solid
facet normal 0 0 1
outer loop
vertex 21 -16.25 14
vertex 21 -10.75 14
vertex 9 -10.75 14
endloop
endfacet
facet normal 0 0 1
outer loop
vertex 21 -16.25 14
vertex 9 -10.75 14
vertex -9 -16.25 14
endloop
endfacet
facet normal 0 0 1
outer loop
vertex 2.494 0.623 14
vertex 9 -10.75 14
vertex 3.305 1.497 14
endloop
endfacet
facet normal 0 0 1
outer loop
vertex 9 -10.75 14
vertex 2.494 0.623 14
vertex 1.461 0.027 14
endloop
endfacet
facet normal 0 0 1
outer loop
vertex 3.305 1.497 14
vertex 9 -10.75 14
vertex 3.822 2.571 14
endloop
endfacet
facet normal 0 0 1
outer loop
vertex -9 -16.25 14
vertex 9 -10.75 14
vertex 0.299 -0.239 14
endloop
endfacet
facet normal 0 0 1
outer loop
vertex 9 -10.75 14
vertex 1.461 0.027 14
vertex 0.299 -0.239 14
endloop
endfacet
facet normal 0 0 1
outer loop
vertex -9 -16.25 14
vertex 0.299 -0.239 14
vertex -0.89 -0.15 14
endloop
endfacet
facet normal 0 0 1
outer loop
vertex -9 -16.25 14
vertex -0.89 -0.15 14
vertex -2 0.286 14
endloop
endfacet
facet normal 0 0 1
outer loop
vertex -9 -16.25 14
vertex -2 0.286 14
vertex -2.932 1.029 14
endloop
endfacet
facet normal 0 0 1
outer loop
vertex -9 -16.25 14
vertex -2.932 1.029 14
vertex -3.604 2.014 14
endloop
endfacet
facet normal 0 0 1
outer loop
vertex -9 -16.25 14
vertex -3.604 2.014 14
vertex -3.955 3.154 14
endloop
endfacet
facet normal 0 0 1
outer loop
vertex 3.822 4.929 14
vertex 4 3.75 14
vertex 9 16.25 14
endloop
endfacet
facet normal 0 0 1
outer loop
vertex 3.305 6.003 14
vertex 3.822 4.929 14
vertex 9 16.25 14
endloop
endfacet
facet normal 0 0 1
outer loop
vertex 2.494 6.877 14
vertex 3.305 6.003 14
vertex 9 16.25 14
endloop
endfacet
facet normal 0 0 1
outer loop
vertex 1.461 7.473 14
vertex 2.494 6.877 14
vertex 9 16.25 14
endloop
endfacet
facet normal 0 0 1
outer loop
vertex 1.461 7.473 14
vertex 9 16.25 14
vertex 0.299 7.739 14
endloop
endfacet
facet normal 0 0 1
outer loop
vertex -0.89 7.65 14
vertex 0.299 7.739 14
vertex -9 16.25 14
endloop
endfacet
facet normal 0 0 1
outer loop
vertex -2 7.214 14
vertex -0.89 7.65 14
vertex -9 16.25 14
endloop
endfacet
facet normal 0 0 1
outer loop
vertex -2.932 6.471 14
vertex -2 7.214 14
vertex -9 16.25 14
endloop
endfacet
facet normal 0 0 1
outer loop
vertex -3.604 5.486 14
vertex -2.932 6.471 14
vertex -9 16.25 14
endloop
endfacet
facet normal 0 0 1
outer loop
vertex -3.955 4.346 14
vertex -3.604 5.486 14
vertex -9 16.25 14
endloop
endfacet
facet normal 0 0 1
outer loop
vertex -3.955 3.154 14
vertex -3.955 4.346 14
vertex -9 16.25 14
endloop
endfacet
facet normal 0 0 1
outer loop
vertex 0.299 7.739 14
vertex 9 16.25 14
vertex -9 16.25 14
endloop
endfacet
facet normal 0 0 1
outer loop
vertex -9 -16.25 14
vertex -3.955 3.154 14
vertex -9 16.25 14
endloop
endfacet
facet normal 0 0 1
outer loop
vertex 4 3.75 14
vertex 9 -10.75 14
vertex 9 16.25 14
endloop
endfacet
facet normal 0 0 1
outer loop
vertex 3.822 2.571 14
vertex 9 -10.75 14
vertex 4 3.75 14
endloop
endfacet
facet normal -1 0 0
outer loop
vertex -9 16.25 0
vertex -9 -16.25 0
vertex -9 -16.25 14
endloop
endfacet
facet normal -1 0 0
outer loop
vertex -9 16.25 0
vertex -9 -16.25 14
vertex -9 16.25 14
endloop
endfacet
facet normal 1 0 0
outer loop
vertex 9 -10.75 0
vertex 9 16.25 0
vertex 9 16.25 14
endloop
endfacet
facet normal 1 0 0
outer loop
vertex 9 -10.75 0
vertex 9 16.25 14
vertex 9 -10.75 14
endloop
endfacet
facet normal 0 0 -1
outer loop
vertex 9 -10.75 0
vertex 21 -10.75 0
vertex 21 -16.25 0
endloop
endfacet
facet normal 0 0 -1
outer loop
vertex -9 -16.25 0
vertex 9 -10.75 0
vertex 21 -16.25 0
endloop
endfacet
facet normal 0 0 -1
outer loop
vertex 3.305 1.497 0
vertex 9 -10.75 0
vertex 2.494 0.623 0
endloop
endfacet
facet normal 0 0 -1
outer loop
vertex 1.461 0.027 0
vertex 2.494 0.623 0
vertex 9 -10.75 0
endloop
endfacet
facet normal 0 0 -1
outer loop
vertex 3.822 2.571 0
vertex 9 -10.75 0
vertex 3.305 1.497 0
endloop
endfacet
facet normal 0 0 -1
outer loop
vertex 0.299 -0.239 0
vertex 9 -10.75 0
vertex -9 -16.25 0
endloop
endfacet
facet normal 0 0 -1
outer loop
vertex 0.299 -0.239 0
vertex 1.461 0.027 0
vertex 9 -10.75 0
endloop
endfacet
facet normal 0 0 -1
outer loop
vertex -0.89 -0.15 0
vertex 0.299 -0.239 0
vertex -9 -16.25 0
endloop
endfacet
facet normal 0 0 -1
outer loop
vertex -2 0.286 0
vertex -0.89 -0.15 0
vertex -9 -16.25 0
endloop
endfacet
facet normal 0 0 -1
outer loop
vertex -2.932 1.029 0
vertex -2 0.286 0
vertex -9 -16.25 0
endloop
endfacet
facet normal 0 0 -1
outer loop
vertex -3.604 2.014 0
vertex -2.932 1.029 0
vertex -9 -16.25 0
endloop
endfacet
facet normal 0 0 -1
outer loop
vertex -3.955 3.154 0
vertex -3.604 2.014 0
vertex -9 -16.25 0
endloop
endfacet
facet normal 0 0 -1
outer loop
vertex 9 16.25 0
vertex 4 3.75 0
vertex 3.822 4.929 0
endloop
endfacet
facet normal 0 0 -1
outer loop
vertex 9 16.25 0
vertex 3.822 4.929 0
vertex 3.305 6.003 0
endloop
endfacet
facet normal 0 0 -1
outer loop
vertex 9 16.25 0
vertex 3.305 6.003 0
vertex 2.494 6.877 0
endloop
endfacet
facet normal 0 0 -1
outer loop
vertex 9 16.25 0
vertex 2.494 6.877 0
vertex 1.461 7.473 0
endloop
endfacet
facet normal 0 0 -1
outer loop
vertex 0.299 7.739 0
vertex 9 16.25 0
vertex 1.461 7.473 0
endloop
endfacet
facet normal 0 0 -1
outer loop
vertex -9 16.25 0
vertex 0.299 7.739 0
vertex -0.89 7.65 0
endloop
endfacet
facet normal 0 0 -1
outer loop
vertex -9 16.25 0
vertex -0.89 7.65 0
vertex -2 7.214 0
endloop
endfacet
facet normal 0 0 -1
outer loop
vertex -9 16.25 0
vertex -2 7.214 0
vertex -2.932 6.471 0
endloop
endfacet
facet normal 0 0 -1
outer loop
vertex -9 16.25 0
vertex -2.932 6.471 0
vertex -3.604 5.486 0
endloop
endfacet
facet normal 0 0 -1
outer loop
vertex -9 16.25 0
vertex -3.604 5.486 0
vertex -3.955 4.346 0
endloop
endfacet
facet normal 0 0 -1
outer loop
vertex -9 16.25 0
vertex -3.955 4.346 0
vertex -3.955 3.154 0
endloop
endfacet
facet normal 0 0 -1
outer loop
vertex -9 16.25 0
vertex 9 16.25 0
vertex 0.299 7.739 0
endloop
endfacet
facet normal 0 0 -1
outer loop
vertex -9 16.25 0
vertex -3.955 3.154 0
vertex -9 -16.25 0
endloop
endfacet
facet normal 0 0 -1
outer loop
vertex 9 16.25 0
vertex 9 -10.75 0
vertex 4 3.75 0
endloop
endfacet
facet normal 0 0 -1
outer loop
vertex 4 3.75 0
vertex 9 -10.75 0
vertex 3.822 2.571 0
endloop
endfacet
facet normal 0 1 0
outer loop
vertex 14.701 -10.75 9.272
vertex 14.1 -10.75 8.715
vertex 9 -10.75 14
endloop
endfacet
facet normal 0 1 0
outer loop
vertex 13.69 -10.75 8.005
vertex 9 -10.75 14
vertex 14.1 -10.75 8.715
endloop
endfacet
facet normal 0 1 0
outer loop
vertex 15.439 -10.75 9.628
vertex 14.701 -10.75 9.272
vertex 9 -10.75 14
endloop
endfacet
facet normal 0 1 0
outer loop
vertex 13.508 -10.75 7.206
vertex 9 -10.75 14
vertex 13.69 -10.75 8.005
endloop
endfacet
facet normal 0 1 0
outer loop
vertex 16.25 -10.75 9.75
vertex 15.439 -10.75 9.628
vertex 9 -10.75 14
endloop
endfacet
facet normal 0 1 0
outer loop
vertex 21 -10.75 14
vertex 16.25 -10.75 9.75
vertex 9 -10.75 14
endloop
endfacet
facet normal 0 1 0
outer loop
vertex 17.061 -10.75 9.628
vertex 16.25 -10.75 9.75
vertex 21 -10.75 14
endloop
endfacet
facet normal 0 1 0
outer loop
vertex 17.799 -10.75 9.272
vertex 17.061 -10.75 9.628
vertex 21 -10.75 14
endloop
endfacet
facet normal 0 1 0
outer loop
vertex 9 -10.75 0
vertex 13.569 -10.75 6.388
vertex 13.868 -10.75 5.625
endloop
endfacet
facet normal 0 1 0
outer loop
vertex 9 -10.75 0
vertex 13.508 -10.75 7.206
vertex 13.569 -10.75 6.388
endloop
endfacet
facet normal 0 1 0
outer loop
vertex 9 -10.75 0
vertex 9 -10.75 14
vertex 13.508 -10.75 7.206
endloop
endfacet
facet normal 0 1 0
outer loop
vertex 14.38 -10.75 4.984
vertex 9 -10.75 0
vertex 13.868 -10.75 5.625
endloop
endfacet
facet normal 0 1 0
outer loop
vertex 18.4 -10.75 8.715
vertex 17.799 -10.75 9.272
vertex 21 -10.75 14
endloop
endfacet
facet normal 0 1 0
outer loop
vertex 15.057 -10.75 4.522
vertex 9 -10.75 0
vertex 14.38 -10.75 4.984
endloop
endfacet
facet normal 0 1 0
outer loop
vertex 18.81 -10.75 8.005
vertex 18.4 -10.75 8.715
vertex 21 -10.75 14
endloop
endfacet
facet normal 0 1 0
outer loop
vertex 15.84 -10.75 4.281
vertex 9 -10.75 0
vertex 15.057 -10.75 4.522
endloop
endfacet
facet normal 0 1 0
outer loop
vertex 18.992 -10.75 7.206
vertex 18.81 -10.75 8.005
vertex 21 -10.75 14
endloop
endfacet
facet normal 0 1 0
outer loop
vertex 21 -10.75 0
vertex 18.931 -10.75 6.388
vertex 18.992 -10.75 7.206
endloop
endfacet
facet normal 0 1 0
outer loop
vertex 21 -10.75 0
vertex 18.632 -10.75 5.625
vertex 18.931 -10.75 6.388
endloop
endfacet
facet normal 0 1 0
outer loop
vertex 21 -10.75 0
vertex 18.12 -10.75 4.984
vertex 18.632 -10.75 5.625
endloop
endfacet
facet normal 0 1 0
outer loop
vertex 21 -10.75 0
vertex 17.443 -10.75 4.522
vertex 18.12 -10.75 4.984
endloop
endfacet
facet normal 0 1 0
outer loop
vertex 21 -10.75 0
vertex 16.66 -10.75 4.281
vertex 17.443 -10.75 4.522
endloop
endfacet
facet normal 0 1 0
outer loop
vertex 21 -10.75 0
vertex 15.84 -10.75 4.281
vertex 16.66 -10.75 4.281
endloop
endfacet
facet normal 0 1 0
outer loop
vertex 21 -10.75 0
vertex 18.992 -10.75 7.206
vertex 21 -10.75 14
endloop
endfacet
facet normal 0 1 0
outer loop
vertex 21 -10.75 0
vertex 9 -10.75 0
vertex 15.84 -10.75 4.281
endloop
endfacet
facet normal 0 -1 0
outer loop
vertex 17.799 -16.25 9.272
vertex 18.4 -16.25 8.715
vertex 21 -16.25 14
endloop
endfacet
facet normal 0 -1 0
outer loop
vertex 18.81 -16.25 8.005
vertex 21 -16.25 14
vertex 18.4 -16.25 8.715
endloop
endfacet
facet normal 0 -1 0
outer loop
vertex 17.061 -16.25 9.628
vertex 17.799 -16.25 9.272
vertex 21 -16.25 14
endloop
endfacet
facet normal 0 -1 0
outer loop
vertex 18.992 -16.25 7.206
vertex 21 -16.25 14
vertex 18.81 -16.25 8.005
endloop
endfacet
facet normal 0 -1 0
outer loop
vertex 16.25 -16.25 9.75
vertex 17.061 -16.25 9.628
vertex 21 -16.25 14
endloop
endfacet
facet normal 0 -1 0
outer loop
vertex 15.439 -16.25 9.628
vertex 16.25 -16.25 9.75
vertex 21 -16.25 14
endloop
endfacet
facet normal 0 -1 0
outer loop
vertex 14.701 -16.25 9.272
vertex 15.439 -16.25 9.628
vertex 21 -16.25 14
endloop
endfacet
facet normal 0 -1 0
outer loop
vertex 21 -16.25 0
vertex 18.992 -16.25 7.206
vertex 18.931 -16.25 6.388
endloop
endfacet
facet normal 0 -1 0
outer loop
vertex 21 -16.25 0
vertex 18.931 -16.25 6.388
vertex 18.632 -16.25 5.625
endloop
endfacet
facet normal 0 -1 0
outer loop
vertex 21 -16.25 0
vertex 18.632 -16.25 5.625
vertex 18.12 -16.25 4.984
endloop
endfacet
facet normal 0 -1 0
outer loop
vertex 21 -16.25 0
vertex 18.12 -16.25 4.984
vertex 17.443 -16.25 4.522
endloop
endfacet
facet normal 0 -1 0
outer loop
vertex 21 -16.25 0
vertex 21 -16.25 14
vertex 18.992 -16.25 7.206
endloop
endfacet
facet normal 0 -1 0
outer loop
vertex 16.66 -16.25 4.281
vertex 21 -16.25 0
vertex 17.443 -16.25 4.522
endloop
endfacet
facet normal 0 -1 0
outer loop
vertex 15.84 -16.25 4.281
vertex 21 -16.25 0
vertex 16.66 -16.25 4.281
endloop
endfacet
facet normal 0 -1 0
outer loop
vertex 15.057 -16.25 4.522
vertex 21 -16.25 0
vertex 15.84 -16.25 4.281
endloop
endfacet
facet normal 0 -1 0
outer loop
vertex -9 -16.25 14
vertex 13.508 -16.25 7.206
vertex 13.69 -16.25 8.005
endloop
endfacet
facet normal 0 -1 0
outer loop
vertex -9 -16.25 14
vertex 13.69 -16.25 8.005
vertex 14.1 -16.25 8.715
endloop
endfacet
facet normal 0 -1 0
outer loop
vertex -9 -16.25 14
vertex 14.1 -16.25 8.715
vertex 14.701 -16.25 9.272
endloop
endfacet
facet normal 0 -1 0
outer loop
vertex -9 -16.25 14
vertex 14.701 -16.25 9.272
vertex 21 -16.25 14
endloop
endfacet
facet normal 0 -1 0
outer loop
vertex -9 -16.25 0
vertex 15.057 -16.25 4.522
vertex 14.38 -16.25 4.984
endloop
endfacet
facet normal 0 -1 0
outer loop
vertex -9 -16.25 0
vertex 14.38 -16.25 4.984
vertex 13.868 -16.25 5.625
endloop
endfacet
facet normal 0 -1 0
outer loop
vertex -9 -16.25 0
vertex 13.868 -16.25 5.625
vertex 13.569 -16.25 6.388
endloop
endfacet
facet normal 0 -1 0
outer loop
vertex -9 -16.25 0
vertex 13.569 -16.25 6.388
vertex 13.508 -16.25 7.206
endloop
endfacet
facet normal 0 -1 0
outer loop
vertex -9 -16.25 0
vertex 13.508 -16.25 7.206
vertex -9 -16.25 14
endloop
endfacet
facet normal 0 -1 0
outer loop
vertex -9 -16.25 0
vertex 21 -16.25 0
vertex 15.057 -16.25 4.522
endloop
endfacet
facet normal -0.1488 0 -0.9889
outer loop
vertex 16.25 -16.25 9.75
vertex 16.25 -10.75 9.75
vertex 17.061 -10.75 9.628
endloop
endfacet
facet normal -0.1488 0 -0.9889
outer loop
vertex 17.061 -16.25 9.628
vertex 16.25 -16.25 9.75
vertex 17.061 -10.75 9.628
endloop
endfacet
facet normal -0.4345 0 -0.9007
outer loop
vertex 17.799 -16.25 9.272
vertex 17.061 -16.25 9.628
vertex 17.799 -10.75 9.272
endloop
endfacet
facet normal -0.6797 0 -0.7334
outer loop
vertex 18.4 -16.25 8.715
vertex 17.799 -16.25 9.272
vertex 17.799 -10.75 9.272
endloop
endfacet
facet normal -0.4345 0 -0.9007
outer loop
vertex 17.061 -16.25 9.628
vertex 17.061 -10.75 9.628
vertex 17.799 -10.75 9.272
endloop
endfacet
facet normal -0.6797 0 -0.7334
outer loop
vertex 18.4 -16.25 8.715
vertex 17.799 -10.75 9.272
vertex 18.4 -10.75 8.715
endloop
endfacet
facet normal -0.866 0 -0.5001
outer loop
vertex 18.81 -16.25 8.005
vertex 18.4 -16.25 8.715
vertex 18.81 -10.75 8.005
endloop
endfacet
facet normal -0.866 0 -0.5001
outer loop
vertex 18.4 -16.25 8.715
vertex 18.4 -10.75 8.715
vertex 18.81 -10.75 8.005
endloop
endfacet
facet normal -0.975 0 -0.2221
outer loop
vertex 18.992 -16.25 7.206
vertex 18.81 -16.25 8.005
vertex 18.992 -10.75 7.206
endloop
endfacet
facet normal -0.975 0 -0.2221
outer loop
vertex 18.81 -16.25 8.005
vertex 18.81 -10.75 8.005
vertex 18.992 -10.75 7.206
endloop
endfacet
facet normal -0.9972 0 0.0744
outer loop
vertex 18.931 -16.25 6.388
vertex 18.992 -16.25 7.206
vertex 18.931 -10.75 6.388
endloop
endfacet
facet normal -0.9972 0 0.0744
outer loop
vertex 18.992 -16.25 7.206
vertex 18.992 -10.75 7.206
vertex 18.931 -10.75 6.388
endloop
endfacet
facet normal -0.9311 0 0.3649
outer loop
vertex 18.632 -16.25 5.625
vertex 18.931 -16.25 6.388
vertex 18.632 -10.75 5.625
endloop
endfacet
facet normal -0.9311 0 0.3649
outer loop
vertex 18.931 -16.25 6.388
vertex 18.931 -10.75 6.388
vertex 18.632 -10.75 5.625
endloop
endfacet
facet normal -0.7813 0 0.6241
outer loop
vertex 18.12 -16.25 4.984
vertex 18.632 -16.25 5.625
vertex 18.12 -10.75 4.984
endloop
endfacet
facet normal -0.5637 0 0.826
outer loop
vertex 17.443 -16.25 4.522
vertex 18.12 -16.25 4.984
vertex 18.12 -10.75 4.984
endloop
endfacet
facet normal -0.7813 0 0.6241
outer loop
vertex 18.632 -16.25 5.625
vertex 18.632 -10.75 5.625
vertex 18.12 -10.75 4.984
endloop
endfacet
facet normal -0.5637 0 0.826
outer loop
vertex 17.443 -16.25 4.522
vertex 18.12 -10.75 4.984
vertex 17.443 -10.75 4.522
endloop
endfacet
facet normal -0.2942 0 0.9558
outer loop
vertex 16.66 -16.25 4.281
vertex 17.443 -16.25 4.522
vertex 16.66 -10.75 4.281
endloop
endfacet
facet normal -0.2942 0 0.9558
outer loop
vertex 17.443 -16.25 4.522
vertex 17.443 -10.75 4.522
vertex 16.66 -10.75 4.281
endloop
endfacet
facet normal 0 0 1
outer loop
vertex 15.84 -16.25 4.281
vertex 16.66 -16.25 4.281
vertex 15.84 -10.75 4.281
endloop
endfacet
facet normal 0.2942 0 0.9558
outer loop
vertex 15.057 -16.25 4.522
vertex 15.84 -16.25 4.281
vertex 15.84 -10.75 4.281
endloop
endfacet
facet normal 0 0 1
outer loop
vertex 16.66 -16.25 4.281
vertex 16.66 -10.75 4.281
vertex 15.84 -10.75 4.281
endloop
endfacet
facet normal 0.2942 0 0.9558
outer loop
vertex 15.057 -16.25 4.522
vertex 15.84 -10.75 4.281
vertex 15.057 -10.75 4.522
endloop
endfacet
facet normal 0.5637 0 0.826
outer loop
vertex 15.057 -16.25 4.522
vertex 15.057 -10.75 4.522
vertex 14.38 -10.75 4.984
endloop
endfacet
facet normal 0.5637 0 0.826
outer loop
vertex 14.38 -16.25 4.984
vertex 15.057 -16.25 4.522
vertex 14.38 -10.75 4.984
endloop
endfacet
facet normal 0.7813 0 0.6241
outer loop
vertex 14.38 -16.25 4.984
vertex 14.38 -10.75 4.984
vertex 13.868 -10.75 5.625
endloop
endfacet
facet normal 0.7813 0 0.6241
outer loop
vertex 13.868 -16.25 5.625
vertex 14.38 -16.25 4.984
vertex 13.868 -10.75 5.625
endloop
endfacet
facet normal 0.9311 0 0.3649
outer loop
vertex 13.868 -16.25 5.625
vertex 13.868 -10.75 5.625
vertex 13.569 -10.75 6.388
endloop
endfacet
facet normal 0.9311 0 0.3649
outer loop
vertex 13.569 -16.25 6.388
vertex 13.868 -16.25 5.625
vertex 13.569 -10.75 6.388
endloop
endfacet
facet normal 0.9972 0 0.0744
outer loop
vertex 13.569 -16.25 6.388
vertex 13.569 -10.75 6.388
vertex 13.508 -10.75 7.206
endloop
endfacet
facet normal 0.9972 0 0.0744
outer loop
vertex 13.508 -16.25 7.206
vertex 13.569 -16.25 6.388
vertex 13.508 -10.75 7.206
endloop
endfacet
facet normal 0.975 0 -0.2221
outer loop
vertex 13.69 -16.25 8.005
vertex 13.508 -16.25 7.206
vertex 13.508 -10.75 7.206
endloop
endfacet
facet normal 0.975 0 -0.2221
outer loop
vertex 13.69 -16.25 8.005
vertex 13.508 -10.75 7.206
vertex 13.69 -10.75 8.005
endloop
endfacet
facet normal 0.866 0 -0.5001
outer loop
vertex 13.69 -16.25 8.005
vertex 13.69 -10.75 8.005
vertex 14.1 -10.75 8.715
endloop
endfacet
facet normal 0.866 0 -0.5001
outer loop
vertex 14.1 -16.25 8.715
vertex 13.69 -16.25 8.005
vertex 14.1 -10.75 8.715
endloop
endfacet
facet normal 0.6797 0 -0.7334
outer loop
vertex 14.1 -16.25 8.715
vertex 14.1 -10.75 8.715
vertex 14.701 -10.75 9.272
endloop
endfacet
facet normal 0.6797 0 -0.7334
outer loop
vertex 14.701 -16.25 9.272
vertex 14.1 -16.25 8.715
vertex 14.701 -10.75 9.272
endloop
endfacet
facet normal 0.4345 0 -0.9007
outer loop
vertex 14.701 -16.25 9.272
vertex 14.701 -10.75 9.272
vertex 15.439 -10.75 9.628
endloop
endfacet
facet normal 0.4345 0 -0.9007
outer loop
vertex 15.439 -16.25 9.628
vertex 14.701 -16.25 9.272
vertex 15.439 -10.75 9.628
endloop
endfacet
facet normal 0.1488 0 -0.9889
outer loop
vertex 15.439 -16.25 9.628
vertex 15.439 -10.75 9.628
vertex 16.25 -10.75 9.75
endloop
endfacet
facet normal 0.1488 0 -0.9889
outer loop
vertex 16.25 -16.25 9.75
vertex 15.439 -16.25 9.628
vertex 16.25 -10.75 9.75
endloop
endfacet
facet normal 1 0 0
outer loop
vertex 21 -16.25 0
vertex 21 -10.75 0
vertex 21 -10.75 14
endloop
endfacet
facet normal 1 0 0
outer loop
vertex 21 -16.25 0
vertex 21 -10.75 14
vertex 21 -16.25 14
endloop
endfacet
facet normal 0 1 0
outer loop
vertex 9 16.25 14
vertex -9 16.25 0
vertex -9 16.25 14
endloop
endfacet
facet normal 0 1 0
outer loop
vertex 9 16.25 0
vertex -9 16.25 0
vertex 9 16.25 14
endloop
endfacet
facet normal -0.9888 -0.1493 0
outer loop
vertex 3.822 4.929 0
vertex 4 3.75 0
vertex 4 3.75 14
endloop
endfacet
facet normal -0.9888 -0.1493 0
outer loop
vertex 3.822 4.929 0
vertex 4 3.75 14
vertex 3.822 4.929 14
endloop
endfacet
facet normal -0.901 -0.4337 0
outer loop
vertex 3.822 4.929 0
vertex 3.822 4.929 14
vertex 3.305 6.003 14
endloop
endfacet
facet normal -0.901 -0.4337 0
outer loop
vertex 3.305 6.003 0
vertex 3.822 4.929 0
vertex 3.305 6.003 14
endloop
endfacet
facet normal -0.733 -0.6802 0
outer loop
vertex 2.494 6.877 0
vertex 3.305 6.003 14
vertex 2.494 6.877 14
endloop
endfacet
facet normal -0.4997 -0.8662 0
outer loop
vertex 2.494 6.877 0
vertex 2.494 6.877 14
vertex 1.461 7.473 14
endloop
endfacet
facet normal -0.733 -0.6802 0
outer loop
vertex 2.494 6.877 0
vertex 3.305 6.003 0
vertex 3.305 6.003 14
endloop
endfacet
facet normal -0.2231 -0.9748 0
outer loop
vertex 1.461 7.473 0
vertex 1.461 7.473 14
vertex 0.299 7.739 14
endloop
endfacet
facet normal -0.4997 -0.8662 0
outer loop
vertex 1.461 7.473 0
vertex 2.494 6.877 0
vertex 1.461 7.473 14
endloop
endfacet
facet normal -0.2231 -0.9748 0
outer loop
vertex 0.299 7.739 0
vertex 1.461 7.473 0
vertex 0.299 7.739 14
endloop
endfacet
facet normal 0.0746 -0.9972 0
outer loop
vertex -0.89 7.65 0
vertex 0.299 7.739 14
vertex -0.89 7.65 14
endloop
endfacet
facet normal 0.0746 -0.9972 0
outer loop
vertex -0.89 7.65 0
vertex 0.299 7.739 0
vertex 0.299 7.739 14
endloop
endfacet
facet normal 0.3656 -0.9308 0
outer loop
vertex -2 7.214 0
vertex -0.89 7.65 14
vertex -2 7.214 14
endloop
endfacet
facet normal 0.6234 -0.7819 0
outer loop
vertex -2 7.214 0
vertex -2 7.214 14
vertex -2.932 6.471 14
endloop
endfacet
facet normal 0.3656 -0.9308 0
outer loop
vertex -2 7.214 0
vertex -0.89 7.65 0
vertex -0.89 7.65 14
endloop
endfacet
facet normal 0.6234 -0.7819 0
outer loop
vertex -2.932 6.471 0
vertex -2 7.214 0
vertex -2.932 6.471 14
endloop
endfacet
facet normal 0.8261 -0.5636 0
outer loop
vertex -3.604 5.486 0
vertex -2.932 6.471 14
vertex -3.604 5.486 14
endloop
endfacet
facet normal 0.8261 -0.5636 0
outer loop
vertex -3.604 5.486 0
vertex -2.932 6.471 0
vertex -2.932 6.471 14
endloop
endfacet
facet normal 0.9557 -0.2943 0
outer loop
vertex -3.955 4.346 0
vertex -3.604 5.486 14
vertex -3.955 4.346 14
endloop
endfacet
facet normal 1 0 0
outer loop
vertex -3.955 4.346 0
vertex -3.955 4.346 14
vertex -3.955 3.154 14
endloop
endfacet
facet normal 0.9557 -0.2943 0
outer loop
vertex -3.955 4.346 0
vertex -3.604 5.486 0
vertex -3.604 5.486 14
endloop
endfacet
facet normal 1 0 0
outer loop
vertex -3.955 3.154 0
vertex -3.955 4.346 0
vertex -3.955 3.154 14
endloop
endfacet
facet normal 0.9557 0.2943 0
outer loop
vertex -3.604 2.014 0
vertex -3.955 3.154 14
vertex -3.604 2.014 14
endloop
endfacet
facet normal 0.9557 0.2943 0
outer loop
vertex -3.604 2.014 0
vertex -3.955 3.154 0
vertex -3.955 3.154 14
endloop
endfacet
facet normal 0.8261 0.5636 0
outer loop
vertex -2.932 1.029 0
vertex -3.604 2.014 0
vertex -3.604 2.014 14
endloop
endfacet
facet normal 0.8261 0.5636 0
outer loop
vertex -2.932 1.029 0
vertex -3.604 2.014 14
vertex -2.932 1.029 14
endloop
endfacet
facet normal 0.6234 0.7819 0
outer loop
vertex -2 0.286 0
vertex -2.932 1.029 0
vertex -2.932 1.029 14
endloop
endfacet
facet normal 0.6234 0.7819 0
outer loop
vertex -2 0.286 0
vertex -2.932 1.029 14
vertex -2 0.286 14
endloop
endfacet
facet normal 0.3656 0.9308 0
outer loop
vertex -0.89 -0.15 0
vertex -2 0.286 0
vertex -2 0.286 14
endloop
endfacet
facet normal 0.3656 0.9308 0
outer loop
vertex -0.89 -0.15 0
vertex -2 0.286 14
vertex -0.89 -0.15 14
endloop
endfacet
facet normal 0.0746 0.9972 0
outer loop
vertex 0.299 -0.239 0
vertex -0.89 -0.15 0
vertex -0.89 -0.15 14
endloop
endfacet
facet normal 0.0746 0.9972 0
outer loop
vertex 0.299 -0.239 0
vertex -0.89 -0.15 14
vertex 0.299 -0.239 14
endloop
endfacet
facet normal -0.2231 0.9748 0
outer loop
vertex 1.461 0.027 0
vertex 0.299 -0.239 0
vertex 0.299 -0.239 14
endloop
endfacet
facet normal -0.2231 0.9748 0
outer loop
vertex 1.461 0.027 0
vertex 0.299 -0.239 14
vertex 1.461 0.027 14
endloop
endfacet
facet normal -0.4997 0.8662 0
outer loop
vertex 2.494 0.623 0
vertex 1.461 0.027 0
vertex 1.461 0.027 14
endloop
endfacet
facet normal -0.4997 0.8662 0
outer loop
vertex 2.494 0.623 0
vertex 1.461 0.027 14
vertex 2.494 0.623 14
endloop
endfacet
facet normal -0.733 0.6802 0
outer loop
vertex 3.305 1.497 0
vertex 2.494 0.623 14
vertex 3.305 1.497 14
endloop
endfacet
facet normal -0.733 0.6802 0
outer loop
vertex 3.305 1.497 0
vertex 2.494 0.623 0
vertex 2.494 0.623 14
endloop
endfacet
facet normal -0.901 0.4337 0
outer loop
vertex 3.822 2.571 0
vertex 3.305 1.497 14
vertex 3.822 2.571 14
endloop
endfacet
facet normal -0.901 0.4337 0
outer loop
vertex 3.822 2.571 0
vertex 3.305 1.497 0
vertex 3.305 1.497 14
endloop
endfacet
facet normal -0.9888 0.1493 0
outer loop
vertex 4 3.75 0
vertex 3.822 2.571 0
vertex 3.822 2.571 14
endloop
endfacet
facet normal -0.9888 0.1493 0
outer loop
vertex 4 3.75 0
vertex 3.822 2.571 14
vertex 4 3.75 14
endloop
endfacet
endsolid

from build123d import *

# Parameters (mm, degrees)
SKETCH_1_R          = 4
EXTRUDE_1_DEPTH     = 14
SKETCH_2_R          = 2.75
CUT_EXTRUDE_1_DEPTH = 14
SKETCH_3_W          = 12
SKETCH_3_H          = 14
CUT_EXTRUDE_2_DEPTH = 10


with BuildPart() as part:
    # 草图1 → 凸台-拉伸1 (new body)
    with BuildSketch(Plane.XY):
        Polygon((-21, -10.75), (-9, -10.75), (-9, 16.25), (9, 16.25), (9, -10.75), (21, -10.75), (21, -16.25), (-21, -16.25), align=None)
        with Locations((0, 3.75)):
            Circle(SKETCH_1_R, mode=Mode.SUBTRACT)
    extrude(amount=EXTRUDE_1_DEPTH)

    # 草图2 → 切除-拉伸1 (cut)
    with BuildSketch(Plane(origin=(0, -10.75, 0), x_dir=(1, 0, 0), z_dir=(0, 1, 0))):
        with Locations(Location((-16.25, -7, 0), (0, 0, 270))):
            Circle(SKETCH_2_R)
        with Locations(Location((16.25, -7, 0), (0, 0, 270))):
            Circle(SKETCH_2_R)
    extrude(amount=-CUT_EXTRUDE_1_DEPTH, mode=Mode.SUBTRACT)

    # 草图3 → 切除-拉伸2 (cut)
    with BuildSketch(Plane(origin=(0, -10.75, 0), x_dir=(1, 0, 0), z_dir=(0, 1, 0))):
        with Locations((-15, -7)):
            Rectangle(SKETCH_3_W, SKETCH_3_H)
    extrude(amount=-CUT_EXTRUDE_2_DEPTH, mode=Mode.SUBTRACT)


solid = part.part
